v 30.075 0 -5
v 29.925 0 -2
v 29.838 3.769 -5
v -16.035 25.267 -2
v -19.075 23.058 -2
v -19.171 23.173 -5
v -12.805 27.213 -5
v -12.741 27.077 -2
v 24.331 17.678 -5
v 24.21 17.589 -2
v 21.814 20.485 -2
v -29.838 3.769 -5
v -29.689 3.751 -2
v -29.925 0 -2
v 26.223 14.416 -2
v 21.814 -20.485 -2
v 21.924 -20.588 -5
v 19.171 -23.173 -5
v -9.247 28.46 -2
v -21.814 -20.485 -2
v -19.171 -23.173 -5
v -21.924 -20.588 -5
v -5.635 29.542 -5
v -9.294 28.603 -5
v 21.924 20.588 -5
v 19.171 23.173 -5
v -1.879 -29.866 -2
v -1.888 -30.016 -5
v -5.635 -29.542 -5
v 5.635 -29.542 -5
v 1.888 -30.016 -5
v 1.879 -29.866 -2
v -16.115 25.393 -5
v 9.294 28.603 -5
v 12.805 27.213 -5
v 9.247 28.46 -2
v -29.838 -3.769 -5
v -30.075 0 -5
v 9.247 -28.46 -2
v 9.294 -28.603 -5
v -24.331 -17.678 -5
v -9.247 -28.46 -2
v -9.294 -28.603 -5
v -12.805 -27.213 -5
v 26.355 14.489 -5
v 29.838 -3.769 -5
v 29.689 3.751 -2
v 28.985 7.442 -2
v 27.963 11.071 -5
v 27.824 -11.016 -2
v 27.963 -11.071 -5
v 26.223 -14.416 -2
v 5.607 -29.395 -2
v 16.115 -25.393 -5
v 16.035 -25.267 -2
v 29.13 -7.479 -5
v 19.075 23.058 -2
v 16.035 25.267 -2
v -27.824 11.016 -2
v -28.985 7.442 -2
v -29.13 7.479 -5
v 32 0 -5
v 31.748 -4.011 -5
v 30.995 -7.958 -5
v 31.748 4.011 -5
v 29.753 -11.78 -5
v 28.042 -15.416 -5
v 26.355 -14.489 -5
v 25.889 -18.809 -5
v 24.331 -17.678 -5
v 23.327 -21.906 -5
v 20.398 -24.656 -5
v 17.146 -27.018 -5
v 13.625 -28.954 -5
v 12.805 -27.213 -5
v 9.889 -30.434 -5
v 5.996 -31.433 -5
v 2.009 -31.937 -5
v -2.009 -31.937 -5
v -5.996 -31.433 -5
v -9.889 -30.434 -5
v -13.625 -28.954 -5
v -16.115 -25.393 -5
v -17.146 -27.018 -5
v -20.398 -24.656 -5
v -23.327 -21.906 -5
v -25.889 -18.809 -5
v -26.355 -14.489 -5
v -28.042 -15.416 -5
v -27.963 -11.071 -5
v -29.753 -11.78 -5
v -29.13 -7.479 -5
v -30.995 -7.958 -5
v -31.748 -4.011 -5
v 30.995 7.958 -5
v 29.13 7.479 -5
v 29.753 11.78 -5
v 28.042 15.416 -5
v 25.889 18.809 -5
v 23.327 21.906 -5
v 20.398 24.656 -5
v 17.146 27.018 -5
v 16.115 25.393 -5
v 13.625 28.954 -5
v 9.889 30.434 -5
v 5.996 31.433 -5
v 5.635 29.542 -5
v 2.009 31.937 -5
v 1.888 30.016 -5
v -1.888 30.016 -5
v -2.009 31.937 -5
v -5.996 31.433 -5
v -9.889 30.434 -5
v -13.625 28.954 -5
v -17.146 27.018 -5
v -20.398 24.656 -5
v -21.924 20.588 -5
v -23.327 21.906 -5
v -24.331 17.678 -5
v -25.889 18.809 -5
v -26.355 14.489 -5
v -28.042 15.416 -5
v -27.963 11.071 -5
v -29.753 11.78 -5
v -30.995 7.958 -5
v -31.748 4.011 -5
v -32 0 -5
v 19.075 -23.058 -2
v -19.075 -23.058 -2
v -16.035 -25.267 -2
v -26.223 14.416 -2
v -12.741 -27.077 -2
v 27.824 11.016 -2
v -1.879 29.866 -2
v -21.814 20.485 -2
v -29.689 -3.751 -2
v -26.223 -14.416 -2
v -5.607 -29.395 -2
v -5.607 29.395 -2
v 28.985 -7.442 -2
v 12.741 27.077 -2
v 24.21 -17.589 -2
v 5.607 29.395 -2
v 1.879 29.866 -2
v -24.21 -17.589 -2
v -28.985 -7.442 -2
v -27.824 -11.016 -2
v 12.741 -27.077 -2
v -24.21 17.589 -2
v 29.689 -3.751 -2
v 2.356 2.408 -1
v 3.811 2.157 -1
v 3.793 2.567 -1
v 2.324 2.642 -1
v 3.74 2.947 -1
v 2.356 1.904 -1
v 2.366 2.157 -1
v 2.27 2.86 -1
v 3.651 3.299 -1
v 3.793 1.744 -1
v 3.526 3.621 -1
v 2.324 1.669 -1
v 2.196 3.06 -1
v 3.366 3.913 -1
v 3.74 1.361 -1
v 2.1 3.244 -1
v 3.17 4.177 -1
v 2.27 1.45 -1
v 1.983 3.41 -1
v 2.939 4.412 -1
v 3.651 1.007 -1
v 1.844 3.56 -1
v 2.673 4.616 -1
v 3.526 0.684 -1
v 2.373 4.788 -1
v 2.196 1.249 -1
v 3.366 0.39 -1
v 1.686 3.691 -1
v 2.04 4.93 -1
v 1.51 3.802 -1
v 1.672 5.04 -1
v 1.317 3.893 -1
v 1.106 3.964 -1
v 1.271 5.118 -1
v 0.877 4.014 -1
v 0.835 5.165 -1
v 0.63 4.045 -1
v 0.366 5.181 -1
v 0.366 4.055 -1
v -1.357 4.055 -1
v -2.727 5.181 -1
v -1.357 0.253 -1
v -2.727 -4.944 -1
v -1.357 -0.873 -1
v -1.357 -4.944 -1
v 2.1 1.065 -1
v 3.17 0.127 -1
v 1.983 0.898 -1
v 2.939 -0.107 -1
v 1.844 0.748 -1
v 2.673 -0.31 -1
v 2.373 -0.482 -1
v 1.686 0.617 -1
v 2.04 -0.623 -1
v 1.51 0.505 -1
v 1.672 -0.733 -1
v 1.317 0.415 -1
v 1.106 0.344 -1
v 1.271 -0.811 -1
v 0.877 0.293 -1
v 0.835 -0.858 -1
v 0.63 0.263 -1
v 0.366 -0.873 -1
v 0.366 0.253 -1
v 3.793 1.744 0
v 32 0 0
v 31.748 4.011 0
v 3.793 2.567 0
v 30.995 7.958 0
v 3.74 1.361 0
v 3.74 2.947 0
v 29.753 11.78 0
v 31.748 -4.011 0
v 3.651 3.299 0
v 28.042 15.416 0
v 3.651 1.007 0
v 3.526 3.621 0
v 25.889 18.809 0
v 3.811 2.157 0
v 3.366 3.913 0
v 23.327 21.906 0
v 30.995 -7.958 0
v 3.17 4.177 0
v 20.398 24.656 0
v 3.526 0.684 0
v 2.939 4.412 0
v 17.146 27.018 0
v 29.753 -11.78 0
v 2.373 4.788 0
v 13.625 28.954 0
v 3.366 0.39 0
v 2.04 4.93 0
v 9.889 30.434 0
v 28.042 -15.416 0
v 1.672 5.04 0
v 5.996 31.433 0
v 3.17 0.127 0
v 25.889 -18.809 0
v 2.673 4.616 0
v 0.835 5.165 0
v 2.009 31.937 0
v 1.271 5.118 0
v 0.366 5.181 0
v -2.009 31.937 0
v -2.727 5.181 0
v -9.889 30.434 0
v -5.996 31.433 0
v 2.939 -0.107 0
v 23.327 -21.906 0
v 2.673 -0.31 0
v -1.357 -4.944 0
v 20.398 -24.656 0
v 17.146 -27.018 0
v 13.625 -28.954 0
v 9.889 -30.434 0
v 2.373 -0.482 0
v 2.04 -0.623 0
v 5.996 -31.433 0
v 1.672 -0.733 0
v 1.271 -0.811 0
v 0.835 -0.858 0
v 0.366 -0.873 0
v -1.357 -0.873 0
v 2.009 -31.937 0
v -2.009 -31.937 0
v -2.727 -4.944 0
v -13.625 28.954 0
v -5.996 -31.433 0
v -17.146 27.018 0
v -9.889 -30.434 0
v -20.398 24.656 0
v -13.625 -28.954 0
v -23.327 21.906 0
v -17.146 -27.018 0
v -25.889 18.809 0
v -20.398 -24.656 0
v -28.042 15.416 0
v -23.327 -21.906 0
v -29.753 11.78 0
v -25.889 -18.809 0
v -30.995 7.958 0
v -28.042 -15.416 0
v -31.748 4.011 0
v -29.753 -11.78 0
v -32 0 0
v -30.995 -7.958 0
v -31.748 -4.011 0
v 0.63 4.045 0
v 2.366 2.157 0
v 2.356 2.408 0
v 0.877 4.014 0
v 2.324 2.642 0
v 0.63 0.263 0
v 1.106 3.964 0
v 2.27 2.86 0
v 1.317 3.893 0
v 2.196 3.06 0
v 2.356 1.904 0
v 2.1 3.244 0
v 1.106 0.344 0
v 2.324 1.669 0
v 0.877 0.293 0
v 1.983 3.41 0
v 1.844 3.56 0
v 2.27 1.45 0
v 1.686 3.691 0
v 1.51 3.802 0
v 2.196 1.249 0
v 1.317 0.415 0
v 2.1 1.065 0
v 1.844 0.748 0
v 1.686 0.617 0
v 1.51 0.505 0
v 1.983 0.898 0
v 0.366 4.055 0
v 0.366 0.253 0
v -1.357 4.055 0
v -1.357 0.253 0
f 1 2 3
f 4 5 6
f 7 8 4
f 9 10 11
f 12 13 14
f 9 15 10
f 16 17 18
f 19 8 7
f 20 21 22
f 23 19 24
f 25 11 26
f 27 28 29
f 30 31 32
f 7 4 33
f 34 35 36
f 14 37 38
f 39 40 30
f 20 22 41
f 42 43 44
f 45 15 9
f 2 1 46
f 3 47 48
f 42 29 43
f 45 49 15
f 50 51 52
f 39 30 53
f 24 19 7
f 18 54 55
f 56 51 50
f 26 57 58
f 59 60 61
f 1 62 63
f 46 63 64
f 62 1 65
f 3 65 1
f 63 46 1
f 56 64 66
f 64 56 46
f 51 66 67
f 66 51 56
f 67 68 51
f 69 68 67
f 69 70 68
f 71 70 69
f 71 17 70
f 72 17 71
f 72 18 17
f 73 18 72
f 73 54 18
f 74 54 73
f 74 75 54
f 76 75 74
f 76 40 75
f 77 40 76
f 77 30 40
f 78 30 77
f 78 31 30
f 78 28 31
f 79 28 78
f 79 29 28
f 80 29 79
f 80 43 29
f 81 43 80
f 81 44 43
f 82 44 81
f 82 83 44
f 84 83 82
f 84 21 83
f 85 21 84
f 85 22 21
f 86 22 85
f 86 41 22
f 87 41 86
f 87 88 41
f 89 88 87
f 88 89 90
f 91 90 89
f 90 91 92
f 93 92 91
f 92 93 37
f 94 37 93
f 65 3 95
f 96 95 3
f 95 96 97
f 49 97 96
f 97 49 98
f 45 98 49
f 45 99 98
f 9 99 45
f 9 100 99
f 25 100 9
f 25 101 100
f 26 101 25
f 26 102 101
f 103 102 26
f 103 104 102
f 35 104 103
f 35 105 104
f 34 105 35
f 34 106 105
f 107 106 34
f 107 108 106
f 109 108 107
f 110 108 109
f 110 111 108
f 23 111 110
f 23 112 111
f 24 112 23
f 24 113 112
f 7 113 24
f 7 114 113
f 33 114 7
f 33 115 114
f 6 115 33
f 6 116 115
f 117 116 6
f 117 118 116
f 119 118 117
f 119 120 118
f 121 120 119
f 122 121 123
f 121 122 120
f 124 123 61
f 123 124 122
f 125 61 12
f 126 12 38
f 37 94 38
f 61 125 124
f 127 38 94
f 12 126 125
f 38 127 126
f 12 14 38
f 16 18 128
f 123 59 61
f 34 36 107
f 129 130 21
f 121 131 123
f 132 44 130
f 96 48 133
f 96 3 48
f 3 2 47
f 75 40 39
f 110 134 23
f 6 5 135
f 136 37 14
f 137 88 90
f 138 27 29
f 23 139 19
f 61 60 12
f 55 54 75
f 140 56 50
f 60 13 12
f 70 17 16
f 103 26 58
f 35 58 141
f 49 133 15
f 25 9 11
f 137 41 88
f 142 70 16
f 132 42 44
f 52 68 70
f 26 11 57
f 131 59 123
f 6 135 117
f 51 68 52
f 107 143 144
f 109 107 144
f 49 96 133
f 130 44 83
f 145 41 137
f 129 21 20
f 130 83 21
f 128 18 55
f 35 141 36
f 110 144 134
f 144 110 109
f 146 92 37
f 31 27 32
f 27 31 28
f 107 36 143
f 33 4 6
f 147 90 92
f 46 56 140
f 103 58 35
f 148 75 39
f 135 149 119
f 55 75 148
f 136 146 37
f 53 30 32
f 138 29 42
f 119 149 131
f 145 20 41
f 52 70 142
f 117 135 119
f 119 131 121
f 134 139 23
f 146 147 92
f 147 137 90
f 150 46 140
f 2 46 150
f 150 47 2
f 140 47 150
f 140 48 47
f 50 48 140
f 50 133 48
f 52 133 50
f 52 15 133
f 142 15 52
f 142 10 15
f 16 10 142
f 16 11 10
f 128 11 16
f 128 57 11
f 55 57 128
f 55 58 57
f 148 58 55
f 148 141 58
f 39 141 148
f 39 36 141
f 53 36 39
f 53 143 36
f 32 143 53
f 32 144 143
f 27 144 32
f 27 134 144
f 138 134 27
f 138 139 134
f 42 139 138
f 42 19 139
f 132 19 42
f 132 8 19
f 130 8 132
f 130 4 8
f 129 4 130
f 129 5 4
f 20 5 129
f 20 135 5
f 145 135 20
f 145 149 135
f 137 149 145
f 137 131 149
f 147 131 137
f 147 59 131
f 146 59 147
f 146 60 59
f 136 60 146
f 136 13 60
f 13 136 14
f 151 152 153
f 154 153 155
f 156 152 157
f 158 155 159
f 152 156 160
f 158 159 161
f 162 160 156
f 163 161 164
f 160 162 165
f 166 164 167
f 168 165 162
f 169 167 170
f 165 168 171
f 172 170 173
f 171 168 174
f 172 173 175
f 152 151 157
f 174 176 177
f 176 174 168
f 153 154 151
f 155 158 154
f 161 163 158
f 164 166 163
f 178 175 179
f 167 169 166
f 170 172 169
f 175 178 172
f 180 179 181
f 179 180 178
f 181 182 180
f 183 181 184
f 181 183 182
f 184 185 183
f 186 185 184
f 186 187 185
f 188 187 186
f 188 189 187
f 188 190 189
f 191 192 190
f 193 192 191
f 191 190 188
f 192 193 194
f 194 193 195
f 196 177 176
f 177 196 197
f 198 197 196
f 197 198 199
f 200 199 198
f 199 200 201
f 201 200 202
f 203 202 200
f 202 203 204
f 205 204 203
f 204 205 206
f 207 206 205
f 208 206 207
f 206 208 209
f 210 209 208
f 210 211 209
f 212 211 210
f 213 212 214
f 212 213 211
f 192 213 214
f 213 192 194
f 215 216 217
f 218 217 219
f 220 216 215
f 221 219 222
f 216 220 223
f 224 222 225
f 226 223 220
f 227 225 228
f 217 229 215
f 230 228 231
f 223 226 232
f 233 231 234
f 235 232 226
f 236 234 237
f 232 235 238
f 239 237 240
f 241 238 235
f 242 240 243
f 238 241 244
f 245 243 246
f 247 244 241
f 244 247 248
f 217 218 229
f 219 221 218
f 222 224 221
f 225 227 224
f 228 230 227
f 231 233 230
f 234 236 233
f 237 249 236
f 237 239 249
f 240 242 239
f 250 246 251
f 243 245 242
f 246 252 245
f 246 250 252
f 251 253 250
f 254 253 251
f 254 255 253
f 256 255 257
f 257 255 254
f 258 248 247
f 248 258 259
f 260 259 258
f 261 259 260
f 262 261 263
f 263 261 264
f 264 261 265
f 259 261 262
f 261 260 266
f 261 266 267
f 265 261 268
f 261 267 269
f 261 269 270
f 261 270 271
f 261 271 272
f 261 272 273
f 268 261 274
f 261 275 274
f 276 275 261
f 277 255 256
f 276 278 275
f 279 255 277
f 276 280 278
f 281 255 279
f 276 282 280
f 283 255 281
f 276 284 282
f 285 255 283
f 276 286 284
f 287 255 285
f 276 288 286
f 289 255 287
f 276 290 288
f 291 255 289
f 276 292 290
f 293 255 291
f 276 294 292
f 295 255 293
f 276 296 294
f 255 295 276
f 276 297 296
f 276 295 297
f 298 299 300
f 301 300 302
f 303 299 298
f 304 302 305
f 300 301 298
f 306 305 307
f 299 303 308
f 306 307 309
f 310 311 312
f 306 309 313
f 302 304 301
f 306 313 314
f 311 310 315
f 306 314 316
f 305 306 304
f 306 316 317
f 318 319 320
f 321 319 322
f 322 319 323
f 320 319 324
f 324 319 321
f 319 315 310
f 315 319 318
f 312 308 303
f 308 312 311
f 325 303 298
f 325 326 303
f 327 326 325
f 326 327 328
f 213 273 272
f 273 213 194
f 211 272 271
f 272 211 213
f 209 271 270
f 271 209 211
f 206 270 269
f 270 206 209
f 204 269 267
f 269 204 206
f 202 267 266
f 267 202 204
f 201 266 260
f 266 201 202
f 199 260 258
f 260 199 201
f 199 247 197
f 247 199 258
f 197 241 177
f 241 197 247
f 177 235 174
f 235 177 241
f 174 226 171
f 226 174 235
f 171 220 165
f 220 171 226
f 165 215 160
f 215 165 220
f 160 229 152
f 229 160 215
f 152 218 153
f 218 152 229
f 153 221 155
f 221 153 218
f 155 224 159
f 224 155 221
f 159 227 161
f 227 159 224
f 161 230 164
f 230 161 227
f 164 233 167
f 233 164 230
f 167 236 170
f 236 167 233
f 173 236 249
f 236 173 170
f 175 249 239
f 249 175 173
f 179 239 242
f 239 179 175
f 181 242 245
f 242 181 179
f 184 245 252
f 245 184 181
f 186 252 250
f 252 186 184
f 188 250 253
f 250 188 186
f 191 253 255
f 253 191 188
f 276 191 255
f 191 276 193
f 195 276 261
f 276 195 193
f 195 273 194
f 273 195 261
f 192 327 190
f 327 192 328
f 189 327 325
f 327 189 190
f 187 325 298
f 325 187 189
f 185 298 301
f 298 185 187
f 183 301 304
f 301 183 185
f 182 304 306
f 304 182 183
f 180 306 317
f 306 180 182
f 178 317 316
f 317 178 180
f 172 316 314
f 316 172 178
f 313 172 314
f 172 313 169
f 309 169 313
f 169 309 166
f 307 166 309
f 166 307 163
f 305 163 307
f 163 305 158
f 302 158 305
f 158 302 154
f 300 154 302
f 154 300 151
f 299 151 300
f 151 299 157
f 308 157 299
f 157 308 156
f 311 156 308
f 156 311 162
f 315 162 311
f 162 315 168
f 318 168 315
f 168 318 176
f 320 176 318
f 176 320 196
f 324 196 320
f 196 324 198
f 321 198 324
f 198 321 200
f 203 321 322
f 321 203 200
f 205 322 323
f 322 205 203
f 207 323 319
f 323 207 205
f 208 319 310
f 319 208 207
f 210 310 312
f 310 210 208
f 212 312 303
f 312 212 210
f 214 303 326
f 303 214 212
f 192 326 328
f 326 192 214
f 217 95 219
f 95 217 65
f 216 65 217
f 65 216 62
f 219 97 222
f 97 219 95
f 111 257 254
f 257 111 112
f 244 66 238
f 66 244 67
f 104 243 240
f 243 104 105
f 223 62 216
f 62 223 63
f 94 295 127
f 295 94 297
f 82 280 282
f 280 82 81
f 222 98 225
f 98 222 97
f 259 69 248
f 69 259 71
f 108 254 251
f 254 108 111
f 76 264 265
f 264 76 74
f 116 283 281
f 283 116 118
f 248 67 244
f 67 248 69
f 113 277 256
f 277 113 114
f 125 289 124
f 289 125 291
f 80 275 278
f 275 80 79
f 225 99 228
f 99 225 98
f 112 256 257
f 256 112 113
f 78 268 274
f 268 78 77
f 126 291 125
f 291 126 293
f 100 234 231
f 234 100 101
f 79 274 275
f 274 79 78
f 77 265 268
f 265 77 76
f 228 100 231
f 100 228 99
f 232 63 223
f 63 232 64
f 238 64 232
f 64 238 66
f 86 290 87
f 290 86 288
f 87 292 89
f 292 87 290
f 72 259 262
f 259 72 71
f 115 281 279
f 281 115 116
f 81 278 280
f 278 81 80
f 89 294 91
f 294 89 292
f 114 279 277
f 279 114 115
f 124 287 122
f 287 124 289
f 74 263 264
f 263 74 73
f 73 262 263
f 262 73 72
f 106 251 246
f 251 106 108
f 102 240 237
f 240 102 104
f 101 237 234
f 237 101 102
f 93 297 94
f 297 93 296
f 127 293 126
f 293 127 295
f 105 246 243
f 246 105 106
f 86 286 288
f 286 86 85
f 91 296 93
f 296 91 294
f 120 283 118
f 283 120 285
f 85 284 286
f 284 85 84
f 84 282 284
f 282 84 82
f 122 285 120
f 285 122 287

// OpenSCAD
$fn = 50;


difference() {
	union() {
		translate(v = [0, 0, -5.0000000000]) {
			cylinder(h = 5, r = 32.0000000000);
		}
	}
	union() {
		#translate(v = [0, 0, -5.0000000000]) {
			cylinder(h = 3, r1 = 30.0750000000, r2 = 29.9250000000);
		}
		translate(v = [0, 0, -1]) {
			linear_extrude(height = 1) {
				text(font = "Impact", halign = "center", size = 10, text = "P", valign = "center");
			}
		}
	}
}
